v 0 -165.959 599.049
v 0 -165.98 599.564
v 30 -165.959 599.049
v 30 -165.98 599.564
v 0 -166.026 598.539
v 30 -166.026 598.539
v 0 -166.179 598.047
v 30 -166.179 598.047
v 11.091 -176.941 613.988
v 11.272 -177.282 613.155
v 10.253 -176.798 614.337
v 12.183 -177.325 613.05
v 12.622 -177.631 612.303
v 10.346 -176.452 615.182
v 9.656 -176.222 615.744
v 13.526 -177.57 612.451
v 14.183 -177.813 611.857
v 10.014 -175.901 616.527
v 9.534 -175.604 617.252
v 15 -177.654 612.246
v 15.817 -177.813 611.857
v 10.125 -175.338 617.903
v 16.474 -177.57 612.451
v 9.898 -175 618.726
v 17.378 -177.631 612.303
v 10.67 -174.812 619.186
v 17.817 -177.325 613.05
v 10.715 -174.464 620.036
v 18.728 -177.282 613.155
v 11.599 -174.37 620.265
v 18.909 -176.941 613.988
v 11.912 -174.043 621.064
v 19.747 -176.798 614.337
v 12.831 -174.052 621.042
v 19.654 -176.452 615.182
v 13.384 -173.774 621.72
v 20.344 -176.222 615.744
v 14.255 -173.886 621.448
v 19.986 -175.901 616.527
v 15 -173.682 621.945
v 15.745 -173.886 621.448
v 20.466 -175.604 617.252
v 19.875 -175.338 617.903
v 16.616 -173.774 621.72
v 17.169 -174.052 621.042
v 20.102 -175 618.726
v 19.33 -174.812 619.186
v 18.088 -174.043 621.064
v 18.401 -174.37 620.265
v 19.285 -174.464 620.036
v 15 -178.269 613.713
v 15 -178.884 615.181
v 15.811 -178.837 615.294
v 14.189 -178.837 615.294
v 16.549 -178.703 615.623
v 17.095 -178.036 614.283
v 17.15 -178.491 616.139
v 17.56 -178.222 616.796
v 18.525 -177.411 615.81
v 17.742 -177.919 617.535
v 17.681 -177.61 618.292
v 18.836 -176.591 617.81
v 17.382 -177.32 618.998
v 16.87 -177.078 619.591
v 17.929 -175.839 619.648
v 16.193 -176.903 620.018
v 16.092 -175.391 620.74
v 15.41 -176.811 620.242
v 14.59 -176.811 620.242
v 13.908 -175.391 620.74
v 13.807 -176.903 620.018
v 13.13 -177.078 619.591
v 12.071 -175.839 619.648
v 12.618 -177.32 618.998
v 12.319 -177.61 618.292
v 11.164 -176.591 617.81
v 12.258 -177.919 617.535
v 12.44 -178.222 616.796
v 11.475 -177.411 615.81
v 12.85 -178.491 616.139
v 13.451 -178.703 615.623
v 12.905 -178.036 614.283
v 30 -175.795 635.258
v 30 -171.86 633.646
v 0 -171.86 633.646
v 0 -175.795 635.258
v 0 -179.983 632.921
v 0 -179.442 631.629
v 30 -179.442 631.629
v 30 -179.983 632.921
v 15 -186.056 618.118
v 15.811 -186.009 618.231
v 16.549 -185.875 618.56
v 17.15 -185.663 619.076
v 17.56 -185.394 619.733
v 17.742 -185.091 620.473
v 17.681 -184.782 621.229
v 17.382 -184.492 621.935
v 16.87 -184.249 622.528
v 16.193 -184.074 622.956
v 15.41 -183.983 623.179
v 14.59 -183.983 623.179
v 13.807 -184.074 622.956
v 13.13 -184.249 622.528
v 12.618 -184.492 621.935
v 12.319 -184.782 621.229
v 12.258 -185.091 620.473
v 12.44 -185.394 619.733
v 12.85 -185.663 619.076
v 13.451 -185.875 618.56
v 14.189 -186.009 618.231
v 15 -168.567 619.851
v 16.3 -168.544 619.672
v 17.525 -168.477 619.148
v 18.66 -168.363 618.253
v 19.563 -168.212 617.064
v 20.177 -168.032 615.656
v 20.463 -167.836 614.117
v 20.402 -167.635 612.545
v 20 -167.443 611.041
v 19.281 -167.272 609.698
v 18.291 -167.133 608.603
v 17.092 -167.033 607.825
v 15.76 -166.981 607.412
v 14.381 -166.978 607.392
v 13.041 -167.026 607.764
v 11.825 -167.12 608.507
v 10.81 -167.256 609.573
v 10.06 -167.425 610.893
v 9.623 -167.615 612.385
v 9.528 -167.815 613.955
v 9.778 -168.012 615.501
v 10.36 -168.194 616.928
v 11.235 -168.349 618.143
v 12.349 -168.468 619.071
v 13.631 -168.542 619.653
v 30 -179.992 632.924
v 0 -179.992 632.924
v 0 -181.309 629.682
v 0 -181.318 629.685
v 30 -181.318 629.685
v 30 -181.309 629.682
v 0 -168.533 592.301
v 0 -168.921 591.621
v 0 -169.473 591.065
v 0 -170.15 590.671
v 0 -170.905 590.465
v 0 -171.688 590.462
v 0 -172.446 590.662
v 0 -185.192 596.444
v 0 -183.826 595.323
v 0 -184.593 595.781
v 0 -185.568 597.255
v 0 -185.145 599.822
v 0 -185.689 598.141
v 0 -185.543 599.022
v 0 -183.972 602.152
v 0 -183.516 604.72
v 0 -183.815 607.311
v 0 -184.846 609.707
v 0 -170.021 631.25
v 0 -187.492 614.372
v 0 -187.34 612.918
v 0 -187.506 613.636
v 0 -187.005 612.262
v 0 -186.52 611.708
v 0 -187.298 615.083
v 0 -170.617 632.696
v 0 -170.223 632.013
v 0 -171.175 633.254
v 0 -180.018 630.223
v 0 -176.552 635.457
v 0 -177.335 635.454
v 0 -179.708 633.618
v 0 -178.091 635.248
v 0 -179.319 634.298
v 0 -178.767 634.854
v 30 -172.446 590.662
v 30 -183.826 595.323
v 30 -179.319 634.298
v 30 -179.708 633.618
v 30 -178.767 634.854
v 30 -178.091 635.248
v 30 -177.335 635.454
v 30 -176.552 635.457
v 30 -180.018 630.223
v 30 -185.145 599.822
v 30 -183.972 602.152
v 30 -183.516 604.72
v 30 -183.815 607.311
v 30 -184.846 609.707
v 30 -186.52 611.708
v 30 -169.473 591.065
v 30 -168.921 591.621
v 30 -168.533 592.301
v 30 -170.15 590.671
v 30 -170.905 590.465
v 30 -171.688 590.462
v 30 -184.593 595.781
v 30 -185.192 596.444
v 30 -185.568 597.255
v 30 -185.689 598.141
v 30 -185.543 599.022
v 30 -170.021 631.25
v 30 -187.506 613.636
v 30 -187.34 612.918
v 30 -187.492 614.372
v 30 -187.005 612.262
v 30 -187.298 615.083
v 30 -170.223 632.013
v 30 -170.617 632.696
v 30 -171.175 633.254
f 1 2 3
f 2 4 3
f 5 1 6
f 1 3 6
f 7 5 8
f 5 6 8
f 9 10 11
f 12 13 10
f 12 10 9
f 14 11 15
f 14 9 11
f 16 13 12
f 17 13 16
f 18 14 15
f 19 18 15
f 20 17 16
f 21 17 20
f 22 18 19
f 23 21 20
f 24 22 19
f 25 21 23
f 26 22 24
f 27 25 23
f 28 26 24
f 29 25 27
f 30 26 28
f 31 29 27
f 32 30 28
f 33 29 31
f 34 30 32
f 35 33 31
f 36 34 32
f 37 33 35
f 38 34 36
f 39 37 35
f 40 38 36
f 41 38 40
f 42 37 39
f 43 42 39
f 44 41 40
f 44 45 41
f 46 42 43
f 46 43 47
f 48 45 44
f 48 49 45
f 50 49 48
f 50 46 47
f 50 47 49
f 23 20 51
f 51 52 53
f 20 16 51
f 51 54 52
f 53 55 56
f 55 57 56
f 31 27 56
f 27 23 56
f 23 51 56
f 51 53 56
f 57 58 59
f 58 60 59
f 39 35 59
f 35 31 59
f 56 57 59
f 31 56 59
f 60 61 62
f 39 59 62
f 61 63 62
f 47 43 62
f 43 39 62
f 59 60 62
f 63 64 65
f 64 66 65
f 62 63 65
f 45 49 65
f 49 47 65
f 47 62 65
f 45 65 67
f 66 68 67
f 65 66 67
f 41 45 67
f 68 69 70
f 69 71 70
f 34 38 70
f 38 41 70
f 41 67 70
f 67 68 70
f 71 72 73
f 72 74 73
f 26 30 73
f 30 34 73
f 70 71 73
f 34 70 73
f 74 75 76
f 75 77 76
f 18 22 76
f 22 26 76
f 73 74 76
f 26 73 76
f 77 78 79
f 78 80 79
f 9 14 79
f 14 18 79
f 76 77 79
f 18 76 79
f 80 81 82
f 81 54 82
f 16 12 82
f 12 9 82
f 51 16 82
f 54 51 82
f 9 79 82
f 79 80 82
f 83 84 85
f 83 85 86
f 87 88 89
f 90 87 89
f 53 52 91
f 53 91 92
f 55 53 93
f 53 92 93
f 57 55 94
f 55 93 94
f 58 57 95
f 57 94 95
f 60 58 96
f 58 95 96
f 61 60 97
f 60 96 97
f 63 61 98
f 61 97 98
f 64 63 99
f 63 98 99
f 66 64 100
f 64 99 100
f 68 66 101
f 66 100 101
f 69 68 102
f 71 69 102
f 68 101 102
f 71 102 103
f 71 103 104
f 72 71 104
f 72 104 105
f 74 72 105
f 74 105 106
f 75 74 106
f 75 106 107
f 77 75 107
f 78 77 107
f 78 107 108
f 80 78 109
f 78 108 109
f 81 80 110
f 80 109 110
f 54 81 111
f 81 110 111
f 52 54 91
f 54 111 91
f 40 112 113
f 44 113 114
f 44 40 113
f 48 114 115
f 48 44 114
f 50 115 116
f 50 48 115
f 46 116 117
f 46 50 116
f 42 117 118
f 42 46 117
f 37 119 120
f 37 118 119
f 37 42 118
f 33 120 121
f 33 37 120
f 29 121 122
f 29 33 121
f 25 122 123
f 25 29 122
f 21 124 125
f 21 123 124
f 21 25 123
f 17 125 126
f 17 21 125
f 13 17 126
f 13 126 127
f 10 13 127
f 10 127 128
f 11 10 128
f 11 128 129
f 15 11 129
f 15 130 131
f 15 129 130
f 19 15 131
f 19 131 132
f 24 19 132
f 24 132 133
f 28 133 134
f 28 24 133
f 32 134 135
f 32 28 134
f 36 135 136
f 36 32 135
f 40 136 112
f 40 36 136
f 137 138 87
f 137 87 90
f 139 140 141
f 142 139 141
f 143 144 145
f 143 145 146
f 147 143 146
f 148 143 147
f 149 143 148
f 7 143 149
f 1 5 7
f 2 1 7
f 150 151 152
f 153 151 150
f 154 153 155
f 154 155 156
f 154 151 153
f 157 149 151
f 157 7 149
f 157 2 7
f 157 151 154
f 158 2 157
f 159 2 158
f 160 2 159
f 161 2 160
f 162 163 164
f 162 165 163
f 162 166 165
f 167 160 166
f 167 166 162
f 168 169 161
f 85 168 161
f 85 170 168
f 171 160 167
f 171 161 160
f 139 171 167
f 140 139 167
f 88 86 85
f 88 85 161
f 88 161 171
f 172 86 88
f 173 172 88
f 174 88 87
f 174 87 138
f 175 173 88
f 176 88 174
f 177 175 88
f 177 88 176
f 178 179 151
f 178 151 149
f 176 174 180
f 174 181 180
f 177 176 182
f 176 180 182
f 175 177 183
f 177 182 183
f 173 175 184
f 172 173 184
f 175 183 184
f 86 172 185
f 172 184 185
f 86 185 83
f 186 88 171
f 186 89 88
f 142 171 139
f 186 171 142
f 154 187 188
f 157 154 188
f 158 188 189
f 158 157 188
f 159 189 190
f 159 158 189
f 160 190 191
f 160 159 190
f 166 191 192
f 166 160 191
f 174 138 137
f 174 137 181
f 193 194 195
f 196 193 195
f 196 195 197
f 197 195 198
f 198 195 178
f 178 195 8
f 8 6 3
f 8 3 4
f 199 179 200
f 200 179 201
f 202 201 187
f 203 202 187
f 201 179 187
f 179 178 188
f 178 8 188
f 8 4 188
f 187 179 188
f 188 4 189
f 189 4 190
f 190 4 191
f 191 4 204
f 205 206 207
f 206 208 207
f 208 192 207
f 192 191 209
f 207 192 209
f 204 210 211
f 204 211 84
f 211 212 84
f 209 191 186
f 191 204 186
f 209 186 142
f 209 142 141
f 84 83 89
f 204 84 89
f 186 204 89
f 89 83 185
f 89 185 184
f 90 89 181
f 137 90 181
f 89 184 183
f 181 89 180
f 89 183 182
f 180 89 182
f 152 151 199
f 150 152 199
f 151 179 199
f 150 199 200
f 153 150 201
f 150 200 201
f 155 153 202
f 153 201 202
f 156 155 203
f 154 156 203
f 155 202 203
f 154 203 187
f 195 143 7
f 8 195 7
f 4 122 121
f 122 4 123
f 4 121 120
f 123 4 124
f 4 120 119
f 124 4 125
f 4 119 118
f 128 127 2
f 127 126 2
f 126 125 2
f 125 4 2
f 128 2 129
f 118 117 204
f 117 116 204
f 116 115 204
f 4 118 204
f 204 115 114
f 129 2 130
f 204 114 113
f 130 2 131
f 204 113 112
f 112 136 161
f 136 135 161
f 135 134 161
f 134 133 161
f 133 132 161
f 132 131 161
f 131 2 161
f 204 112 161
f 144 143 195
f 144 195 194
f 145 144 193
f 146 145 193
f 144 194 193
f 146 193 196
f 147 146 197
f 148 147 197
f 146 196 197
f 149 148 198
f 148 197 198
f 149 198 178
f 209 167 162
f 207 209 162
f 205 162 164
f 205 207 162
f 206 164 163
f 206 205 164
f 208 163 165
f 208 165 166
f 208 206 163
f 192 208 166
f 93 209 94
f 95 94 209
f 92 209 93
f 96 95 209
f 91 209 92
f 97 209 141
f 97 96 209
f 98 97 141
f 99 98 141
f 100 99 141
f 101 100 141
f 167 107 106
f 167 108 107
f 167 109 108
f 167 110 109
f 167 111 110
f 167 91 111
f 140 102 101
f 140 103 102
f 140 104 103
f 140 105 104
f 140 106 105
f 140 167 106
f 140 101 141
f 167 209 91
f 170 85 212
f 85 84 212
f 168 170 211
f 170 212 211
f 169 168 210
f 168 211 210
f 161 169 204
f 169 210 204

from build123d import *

# Parameters (mm, degrees)
PAD001_DEPTH        = 30
HOLE002_D           = 5.5
HOLE002_CSINK_D     = 10
HOLE002_CSINK_ANGLE = 90
SKETCH004_R         = 6.501169
SKETCH004_R_2       = 5.481256
POCKET_DEPTH        = 19.5081110955
SKETCH007_W         = 3.5
SKETCH007_H         = 30
POCKET002_DEPTH     = 1
CHAMFER_SIZE        = 0.99
FILLET003_R         = 3


with BuildPart() as part:
    # Sketch002 → Pad001 (new body)
    with BuildSketch(Plane.YZ):
        with BuildLine():
            Line((-188.1964293023, 612.8903873712), (-178.5707253545, 636.394612861))
            Line((-170.2420872134, 632.9837791337), (-178.5707253545, 636.394612861))
            Line((-165.8796609268, 598.7789660675), (-170.2420872134, 632.9837791337))
            Line((-169.6694761794, 589.5249236885), (-165.8796609268, 598.7789660675))
            Line((-188.1775609373, 597.1045541936), (-169.6694761794, 589.5249236885))
            ThreePointArc((-188.1775609373, 597.1045541936), (-183.51155378, 605.0030592067), (-188.1964293023, 612.8903873712))
        make_face()
    extrude(amount=PAD001_DEPTH)

    # Hole002 (through all)
    with Locations(Plane(origin=(0, -366.8597668241, 150.2403687946), x_dir=(0, 0.3789815253, 0.9254042379), z_dir=(0, 0.9254042379, -0.3789815253))):
        with Locations((-506.967621, 13.13074), (504.2472658549, 15)):
            CounterSinkHole(HOLE002_D / 2, HOLE002_CSINK_D / 2, counter_sink_angle=HOLE002_CSINK_ANGLE)

    # Sketch004 (on DatumPlane) → Pocket (cut, through all)
    with BuildSketch(Plane(origin=(0, -366.8597668241, 150.2403687946), x_dir=(0, 0.3789815253, 0.9254042379), z_dir=(0, 0.9254042379, -0.3789815253))):
        with Locations((-506.967621, 13.13074)):
            Circle(SKETCH004_R)
        with Locations((504.2472658549, 15)):
            Circle(SKETCH004_R_2)
    extrude(amount=POCKET_DEPTH, mode=Mode.SUBTRACT)

    # Sketch007 (on Face6 of Pocket) → Pocket002 (cut)
    with BuildSketch(Plane(origin=(0, -376.1138092031, 154.0301840472), x_dir=(0, -0.3789815253, -0.9254042379), z_dir=(0, -0.9254042379, 0.3789815253))):
        with Locations((-515.7472658549, 15)):
            Rectangle(SKETCH007_W, SKETCH007_H)
    extrude(amount=-POCKET002_DEPTH, mode=Mode.SUBTRACT)

    # Chamfer
    chamfer_edges = [part.edges().sort_by_distance(p)[0] for p in [
        (15, -179.066502, 632.545365),
        (15, -180.392937, 629.306451),
    ]]
    chamfer(chamfer_edges, length=CHAMFER_SIZE)

    # Fillet003
    fillet003_edges = [part.edges().sort_by_distance(p)[0] for p in [
        (15, -188.177561, 597.104554),
        (15, -169.669476, 589.524924),
        (15, -165.879661, 598.778966),
        (15, -170.242087, 632.983779),
        (15, -178.570725, 636.394613),
        (15, -188.196429, 612.890387),
    ]]
    fillet(fillet003_edges, radius=FILLET003_R)


solid = part.part
